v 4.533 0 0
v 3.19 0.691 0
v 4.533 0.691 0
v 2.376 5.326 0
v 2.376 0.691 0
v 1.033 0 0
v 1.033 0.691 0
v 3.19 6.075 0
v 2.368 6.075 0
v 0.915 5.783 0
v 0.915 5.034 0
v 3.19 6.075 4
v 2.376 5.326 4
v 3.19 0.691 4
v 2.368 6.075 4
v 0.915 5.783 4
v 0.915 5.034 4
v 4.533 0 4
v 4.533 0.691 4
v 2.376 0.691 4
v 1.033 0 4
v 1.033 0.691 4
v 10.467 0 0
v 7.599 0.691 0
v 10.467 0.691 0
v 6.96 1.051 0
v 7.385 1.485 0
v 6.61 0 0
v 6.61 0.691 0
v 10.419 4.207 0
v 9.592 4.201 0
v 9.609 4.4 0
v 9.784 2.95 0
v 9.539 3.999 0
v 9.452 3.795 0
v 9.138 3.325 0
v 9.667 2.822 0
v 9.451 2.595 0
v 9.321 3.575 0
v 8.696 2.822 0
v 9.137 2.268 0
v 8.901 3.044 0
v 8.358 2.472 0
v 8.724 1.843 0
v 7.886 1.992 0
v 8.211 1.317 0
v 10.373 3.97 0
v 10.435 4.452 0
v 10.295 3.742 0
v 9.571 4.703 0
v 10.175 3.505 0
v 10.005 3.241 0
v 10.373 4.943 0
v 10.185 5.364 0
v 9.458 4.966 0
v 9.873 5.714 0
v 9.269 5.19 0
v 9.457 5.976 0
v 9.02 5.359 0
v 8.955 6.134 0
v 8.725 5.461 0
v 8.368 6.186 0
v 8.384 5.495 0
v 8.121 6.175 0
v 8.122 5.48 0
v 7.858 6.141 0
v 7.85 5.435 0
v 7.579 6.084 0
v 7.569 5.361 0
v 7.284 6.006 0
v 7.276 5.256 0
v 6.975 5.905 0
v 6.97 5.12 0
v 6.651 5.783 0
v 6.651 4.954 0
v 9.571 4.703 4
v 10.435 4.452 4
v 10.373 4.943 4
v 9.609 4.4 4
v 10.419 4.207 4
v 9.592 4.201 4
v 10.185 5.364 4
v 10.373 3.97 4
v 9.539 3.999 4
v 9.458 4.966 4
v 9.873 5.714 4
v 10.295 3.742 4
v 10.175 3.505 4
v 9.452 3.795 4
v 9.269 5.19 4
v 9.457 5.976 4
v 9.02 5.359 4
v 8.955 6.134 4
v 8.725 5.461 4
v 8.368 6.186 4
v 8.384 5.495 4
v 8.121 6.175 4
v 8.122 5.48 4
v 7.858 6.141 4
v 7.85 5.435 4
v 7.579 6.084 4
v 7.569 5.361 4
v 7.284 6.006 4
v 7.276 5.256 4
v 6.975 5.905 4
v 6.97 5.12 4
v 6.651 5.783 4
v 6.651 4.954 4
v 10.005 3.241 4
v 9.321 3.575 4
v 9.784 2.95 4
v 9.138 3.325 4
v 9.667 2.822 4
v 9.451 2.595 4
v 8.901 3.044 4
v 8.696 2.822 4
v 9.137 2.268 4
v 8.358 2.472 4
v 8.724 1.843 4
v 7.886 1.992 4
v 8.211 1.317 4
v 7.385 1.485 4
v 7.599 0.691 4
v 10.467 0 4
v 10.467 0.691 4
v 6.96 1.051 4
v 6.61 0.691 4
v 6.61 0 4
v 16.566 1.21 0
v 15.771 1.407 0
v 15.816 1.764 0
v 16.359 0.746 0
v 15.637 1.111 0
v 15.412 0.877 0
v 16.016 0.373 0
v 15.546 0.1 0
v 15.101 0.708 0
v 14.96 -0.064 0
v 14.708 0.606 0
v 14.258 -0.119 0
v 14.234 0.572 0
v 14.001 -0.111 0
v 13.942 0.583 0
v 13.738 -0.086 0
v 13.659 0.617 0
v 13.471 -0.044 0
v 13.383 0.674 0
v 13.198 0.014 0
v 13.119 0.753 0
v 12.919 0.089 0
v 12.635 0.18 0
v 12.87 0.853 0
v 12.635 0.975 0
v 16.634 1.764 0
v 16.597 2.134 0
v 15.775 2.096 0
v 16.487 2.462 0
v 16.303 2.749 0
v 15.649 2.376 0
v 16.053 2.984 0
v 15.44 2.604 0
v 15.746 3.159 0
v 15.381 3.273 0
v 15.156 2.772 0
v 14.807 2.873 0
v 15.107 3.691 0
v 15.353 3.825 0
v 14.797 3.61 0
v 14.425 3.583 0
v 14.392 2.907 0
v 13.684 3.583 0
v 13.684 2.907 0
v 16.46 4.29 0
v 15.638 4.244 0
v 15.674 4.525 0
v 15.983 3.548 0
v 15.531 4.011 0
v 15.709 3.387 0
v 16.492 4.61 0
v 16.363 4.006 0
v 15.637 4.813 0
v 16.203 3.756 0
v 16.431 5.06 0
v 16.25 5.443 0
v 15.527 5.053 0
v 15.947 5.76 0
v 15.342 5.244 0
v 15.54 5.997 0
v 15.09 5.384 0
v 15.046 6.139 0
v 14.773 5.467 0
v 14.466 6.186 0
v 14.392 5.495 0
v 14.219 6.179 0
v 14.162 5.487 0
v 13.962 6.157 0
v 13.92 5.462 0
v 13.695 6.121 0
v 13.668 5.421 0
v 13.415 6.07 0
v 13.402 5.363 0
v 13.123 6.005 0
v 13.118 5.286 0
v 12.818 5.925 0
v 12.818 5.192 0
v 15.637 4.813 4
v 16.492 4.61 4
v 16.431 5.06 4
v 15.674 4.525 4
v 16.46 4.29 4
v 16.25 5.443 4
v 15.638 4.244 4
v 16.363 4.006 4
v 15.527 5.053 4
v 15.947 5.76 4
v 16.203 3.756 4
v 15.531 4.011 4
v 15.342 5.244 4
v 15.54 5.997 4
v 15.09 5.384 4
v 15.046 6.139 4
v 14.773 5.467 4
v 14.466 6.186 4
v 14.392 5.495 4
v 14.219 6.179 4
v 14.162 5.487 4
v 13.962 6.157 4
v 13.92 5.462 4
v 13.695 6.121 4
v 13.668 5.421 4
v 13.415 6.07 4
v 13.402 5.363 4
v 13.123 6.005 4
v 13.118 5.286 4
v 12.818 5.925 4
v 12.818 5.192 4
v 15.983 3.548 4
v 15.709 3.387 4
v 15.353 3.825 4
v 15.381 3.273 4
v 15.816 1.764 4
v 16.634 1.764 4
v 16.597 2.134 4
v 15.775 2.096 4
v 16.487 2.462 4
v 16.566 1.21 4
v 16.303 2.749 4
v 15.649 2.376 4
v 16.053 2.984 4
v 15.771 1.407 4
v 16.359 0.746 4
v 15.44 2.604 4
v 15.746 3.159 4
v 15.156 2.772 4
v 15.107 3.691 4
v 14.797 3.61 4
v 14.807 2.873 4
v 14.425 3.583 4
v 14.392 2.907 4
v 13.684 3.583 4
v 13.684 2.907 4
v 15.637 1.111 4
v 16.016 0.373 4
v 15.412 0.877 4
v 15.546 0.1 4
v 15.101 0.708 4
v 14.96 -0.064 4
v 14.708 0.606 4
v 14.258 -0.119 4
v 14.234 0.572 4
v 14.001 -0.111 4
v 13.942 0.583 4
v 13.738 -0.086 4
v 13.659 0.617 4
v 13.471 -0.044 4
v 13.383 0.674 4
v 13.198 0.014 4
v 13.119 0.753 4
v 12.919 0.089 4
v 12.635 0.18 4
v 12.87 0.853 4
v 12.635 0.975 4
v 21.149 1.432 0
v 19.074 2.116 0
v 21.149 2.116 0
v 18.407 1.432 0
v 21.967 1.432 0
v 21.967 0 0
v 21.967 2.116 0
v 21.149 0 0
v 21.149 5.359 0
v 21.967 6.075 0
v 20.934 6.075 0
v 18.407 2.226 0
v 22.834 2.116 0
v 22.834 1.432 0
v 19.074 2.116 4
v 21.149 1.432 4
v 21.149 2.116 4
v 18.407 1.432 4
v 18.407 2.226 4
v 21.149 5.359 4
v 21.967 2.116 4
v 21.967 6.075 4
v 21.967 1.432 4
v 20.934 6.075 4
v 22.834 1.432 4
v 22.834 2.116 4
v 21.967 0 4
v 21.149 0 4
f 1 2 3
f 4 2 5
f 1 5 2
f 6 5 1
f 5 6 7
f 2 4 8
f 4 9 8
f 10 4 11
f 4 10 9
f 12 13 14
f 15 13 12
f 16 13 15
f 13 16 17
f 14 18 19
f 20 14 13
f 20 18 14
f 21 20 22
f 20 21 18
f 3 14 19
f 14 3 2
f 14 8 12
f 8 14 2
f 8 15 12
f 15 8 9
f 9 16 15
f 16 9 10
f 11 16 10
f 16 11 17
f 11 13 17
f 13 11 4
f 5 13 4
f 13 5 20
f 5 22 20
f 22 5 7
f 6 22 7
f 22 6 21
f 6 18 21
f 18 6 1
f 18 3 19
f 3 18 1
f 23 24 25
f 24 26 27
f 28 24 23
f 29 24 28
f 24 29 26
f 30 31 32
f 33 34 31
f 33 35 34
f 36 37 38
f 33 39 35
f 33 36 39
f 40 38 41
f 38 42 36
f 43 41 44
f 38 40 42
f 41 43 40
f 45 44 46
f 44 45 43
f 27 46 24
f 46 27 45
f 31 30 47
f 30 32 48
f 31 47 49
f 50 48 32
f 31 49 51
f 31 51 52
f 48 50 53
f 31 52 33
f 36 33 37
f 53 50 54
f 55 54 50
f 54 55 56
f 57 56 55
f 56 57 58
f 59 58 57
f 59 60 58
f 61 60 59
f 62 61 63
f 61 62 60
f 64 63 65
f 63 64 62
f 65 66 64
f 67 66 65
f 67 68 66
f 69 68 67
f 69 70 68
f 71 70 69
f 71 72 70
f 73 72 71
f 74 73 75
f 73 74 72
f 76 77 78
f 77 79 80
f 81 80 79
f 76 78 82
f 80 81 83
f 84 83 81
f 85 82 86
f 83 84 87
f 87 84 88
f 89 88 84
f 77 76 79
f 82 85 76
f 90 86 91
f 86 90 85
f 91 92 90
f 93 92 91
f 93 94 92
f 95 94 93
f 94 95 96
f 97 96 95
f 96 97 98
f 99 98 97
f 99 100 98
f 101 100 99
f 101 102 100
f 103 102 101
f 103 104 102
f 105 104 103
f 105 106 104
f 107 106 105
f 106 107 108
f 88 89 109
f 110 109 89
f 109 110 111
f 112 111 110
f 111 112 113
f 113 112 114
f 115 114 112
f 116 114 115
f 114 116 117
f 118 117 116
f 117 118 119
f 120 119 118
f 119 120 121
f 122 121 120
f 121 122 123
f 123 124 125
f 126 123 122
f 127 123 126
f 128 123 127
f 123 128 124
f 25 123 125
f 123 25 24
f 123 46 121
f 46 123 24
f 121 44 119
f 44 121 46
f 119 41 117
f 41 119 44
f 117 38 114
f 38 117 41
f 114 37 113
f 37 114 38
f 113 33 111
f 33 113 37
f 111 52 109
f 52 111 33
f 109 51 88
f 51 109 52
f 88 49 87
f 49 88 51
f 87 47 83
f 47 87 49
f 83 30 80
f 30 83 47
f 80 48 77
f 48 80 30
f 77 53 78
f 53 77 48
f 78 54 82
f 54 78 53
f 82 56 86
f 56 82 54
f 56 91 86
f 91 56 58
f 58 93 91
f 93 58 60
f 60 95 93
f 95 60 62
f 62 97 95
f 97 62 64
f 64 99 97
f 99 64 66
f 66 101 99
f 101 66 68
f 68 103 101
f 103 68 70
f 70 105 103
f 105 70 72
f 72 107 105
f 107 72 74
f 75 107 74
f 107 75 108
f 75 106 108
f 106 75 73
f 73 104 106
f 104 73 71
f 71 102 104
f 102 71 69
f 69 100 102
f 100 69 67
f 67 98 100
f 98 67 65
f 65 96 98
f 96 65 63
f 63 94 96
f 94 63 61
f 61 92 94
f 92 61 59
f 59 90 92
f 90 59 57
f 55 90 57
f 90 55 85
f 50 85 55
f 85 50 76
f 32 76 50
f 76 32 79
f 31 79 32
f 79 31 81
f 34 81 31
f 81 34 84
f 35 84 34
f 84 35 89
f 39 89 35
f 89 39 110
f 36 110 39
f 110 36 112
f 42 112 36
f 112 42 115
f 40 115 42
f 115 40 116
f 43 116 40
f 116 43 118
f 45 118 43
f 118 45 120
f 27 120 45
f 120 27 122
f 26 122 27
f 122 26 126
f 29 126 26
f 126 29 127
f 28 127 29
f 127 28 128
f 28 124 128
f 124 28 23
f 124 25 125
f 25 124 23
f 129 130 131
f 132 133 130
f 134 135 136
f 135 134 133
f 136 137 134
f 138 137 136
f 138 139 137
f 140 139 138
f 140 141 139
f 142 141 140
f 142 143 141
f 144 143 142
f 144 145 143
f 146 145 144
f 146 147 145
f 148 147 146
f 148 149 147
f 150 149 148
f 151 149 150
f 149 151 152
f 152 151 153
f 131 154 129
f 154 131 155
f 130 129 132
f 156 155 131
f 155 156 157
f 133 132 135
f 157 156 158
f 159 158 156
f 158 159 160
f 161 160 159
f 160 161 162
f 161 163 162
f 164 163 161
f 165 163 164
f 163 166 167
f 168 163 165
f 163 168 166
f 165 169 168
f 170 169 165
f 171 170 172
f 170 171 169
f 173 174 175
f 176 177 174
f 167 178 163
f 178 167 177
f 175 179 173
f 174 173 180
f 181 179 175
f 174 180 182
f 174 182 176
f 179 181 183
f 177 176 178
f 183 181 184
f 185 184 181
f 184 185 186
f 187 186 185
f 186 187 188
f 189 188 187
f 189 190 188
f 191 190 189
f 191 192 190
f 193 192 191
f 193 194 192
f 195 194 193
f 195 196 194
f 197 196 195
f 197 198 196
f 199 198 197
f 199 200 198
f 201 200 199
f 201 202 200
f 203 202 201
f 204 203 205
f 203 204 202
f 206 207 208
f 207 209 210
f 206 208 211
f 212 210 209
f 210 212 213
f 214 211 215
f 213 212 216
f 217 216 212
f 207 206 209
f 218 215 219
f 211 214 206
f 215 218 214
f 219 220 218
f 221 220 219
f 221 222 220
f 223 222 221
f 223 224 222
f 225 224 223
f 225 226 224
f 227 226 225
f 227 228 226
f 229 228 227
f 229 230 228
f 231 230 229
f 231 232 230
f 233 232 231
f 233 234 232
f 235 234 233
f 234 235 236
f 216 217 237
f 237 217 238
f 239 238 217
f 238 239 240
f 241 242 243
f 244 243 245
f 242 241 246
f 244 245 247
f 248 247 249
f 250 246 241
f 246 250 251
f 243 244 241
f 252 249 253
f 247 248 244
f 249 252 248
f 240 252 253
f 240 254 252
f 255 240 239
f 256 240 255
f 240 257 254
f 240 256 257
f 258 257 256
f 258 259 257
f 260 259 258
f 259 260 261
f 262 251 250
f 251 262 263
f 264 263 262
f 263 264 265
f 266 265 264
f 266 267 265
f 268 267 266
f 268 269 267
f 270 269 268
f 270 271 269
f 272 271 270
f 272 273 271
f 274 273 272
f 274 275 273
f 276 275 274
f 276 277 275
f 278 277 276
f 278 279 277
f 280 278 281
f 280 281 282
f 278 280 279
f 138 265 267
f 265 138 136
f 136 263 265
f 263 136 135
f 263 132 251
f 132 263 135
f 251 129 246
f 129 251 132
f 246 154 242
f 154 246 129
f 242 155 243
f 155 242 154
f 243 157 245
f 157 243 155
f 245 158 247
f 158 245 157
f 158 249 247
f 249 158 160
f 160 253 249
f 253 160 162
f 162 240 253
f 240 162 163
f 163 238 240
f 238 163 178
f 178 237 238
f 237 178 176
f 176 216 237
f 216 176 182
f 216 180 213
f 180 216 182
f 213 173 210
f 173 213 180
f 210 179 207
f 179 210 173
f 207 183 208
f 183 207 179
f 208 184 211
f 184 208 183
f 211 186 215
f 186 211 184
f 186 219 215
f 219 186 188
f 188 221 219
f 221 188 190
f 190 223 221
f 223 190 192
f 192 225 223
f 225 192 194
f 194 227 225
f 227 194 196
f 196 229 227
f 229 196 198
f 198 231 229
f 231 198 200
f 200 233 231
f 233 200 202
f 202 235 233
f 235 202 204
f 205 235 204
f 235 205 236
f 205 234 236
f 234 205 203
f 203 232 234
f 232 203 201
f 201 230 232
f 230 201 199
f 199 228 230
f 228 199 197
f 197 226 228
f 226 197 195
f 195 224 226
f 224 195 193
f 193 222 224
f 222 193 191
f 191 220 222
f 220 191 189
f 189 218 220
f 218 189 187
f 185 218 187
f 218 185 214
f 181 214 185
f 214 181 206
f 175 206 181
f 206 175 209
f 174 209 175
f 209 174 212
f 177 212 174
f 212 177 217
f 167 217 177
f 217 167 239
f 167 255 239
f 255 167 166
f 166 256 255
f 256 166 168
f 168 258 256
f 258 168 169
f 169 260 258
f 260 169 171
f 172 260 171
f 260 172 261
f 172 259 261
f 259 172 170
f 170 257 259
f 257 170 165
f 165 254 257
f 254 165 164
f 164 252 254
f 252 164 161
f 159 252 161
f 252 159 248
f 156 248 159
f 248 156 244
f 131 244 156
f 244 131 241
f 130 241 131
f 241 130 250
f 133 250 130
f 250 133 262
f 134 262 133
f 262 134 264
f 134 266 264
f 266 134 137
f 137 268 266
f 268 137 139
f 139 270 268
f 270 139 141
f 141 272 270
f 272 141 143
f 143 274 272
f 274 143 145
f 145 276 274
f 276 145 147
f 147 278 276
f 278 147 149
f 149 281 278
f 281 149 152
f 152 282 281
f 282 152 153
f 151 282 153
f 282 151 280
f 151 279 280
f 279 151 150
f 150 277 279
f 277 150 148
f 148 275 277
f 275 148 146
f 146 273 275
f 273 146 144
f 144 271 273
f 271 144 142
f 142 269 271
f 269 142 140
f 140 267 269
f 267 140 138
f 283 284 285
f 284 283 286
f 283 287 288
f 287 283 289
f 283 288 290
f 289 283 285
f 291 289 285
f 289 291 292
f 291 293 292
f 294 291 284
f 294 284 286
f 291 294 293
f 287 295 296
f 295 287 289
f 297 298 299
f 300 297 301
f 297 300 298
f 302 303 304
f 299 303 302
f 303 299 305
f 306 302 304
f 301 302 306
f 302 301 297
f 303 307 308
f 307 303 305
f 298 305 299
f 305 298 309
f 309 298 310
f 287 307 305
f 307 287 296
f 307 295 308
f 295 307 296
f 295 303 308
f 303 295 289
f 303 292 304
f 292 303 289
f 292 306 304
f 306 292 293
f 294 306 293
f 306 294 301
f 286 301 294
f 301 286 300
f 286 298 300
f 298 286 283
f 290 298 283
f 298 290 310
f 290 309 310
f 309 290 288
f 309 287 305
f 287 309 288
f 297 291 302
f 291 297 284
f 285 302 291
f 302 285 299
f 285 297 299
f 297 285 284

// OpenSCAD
font = "Bauhaus 93:style=Regular";
//font = "Arial";

strings = [["ABC", "1234", "QRS1"], ["+-=", "foo", "bar"]];

oneString = strings[0][1];
echo(oneString);

endIndex = len(oneString) - 1;
for(i = [0 : endIndex])
{
    element = oneString;
    
    // print a single character
    ch = element[i];
    echo(ch);
    
    translate([i*6, 0, 0])
    linear_extrude(height=4)
    text(ch, font=font, size=6);
}
